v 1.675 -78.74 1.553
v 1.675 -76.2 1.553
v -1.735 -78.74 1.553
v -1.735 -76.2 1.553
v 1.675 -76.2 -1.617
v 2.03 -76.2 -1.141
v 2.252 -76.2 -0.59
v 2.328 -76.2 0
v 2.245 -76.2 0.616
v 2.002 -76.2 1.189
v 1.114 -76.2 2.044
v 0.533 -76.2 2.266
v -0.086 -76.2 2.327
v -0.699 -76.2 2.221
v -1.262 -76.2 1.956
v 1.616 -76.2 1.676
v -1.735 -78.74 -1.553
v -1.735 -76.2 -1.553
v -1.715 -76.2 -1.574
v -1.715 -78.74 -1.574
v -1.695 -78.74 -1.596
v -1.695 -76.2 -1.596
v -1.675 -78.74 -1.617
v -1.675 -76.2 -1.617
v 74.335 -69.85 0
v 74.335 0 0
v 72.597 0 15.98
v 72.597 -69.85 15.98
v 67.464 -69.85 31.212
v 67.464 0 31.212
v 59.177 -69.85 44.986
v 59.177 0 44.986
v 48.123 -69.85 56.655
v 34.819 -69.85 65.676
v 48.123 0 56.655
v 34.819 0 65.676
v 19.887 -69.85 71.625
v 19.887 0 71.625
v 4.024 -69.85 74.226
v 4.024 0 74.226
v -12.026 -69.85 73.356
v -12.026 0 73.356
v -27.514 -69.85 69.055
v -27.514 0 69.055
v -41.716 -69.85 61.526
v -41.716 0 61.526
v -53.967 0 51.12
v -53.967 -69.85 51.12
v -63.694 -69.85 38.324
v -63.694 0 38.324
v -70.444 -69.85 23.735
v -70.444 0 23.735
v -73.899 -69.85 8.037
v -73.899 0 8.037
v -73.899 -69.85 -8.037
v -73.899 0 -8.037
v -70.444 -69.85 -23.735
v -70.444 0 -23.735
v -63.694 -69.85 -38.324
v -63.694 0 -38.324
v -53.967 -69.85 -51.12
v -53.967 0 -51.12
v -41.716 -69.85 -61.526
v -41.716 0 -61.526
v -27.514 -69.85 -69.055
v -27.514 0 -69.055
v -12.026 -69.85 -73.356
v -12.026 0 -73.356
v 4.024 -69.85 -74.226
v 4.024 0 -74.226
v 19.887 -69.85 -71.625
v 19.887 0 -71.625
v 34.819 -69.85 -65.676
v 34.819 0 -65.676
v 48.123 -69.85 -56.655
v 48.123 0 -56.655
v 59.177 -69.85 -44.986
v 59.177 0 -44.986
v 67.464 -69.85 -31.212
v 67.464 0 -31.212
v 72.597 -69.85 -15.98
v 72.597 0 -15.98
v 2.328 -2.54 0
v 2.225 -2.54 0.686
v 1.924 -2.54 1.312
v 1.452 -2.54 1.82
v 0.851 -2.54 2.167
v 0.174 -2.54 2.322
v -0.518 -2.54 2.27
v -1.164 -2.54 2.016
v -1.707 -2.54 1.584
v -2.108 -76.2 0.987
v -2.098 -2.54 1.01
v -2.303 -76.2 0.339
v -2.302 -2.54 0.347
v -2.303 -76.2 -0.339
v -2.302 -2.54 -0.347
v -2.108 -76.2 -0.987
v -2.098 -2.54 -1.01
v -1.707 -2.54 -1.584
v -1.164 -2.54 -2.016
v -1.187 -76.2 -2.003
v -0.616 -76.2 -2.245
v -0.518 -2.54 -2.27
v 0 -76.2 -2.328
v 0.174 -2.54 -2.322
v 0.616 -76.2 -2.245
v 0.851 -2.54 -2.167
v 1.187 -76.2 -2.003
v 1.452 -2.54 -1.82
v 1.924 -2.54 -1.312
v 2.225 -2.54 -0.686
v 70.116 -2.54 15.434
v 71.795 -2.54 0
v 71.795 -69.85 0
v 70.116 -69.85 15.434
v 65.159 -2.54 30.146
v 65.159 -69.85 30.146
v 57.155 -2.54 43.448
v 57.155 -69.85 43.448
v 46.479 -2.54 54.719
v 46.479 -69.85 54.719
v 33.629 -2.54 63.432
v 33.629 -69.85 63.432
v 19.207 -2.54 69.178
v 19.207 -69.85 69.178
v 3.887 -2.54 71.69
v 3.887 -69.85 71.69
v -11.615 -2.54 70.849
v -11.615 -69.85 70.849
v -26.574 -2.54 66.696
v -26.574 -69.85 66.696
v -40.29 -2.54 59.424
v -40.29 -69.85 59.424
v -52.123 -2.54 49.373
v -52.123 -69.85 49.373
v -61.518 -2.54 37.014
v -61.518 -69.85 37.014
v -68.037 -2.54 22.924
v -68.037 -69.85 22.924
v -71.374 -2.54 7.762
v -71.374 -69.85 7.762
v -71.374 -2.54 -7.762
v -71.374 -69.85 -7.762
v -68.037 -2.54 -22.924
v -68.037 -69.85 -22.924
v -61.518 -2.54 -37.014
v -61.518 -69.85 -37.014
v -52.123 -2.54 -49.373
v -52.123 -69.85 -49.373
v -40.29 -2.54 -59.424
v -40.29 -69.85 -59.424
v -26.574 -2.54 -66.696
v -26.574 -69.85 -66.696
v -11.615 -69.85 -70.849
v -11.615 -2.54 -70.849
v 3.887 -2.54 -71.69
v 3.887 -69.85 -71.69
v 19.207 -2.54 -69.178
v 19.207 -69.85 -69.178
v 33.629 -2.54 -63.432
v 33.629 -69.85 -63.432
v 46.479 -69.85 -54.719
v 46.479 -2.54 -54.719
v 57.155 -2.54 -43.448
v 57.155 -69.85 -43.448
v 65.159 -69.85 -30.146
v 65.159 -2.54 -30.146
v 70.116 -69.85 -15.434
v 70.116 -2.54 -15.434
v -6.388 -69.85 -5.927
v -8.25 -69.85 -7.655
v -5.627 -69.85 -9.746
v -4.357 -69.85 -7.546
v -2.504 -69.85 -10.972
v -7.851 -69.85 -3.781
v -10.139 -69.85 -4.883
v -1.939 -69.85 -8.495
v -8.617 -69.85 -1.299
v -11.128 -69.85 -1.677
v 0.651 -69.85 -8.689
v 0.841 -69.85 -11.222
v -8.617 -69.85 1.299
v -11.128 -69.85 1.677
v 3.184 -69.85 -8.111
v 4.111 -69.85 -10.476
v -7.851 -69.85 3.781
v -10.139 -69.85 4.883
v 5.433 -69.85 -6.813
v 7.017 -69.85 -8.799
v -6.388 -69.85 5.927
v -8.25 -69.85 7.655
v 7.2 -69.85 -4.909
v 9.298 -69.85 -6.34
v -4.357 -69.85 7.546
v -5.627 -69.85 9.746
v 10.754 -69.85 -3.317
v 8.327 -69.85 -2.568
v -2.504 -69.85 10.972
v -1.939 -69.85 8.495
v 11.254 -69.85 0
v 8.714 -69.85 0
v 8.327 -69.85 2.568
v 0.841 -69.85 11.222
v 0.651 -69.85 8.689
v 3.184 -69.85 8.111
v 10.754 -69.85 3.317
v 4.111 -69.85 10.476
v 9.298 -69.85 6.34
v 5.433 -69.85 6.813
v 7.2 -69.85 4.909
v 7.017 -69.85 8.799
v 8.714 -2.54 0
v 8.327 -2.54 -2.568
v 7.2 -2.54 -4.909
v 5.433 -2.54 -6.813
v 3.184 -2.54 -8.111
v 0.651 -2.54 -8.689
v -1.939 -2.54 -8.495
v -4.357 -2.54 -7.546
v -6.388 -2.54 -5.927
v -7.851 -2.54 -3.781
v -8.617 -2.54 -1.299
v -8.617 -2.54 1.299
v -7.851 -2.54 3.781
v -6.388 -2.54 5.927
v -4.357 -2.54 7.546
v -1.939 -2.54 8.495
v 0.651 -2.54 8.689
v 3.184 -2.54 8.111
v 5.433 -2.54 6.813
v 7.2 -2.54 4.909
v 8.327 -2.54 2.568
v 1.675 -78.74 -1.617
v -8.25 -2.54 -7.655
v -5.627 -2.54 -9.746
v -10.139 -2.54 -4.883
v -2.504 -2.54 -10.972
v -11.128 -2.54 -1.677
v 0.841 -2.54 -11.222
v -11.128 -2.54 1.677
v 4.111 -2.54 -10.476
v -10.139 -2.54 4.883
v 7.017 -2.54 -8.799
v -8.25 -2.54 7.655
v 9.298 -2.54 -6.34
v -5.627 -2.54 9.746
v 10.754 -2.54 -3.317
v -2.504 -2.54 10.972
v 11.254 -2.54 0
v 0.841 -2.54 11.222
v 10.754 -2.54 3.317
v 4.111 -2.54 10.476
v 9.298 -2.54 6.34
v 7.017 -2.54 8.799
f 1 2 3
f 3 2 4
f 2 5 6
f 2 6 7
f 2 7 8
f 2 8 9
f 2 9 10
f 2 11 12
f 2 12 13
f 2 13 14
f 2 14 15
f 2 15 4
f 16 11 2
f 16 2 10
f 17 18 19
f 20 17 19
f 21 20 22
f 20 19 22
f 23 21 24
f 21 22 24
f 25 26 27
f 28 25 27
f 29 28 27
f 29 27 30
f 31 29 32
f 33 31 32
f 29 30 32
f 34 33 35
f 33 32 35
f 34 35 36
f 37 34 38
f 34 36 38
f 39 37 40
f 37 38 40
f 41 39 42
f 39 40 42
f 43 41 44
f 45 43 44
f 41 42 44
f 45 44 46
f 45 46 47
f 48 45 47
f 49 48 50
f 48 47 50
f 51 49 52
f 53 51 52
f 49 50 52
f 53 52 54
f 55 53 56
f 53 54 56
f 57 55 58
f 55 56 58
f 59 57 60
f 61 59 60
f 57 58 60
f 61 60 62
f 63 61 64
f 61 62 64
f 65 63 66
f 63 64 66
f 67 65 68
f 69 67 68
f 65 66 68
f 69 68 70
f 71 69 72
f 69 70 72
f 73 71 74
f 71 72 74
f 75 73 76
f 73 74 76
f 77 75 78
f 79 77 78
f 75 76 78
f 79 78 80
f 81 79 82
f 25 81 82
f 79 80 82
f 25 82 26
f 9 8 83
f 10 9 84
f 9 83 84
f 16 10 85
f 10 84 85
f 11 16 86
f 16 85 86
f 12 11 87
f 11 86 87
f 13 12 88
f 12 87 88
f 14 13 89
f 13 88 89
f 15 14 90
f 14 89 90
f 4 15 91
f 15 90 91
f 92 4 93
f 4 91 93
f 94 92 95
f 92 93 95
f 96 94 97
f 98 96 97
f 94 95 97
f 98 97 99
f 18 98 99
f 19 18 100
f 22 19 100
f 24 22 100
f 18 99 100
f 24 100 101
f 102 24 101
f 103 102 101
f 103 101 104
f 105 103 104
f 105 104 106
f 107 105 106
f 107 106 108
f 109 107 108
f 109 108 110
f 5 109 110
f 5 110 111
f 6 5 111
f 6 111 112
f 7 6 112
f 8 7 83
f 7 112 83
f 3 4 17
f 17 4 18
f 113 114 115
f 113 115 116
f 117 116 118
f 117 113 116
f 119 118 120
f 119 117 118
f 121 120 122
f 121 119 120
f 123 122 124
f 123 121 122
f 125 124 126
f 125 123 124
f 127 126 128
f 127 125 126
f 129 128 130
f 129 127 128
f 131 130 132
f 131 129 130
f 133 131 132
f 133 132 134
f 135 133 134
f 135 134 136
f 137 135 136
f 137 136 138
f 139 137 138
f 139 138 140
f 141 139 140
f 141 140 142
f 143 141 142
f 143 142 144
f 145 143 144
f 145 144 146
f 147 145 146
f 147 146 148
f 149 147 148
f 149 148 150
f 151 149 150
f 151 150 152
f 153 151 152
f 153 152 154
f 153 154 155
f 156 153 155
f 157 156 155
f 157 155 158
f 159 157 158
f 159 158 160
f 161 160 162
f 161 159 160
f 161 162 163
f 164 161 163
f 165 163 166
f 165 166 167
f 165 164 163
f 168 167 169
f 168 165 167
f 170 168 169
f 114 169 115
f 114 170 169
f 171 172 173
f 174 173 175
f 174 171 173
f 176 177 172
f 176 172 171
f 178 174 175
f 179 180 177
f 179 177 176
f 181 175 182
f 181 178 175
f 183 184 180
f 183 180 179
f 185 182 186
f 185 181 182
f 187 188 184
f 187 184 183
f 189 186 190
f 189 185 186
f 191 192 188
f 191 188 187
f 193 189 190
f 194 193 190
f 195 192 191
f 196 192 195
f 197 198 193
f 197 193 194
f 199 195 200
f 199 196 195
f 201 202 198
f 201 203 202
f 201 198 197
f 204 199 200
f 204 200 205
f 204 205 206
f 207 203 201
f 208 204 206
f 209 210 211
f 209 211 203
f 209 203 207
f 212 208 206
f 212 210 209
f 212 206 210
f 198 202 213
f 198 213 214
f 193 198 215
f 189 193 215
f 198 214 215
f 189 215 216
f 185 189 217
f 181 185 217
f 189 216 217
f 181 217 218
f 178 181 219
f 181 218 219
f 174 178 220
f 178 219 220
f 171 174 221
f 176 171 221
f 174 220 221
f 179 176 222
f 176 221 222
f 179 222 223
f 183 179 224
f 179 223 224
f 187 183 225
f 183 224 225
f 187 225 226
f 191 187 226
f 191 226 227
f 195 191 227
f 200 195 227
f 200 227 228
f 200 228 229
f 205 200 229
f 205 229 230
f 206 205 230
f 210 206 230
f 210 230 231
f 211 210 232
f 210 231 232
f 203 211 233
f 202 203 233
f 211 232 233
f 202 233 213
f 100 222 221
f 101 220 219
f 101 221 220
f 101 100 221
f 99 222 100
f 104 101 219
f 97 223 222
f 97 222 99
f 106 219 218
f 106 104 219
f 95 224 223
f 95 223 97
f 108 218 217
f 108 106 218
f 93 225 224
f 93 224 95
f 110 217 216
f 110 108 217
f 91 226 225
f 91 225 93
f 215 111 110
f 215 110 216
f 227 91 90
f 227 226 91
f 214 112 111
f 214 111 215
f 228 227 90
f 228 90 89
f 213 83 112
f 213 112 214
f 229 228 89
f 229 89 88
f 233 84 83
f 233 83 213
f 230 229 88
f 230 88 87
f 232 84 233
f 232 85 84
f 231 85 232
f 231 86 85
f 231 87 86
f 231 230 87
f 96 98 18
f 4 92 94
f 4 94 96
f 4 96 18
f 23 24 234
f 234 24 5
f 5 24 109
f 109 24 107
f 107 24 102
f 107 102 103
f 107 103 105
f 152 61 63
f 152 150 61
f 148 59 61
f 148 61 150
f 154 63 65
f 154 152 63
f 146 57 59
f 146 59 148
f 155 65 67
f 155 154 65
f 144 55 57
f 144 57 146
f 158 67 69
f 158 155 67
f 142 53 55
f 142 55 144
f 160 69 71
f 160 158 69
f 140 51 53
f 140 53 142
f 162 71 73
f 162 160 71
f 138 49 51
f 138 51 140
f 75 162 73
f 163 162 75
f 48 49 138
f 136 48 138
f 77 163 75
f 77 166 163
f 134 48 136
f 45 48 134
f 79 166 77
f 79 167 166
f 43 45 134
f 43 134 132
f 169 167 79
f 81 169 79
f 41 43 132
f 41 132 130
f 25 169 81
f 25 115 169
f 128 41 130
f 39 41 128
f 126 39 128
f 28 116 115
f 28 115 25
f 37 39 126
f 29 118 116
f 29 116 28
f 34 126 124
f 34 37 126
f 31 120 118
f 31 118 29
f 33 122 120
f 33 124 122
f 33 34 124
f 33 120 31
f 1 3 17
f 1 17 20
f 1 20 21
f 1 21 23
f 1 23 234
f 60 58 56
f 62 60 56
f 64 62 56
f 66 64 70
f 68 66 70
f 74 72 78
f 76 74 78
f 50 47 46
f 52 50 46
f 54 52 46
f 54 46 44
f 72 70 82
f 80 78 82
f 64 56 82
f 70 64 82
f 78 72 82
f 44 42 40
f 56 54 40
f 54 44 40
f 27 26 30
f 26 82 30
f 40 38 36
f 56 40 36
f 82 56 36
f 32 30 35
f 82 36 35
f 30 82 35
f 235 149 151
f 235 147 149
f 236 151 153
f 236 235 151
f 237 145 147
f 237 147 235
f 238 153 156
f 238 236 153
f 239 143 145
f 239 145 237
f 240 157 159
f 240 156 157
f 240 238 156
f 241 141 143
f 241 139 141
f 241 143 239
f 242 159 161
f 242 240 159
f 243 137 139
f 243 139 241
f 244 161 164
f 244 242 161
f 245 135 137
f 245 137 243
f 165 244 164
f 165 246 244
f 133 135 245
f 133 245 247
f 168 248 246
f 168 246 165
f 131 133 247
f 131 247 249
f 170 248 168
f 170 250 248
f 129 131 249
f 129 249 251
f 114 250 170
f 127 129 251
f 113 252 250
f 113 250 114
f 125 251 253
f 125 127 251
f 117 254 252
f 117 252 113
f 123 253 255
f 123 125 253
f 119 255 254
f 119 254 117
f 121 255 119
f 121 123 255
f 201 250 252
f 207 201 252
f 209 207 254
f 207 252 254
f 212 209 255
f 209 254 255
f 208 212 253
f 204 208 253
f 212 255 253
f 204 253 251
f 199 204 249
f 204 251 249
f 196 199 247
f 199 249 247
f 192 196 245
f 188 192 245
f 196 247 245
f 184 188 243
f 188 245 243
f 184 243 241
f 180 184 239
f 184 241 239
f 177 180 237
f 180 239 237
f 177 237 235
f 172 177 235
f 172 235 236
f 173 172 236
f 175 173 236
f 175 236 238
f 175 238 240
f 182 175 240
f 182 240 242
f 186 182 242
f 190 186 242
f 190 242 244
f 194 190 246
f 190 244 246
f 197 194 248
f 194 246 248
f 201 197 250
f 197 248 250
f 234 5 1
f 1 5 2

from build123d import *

# Parameters (mm, degrees)
F0_R     = 74.3348604036
F1_DEPTH = 69.85
F2_T     = -2.54
F3_R     = 11.2538360461
F4_DEPTH = 67.31
F5_T     = -2.54
F6_R     = 2.3281724299
F7_DEPTH = 73.66
F9_DEPTH = 2.54


# Not quite as in the source:
# - a shell that OpenCascade refuses in one call is made with other operations: the cavity is built on its own and cut out


with BuildPart() as f1:
    # F0 (on Front) → F1 (new body)
    with BuildSketch(Plane.XZ):
        Circle(F0_R)
    extrude(amount=F1_DEPTH)

    # F2
    f2_openings = [f1.faces().sort_by_distance(p)[0] for p in [
        (0, -69.85, 0),
    ]]
    offset(amount=F2_T, openings=f2_openings)

    # F3 (on face) → F4 (join)
    with BuildSketch(Plane.XZ.offset(2.54)):
        Circle(F3_R)
    extrude(amount=F4_DEPTH)

    # F5: a shell. OpenCascade refuses it in one call, so the cavity is built on its own and cut out:
    # the body offset inwards by the wall thickness, plus a prism from it out through each open face.
    f5_core = offset(f1.part, amount=F5_T, kind=Kind.INTERSECTION, mode=Mode.PRIVATE)
    f5_exits = [f5_core.faces().sort_by_distance(p)[0] for p in [
        (0, -67.31, 0),
    ]]
    add(f5_core, mode=Mode.SUBTRACT)
    extrude(f5_exits, amount=-F5_T, mode=Mode.SUBTRACT)

    # F6 (on face) → F7 (join)
    with BuildSketch(Plane.XZ.offset(2.54)):
        Circle(F6_R)
    extrude(amount=F7_DEPTH)

    # F8 (on face) → F9 (join)
    with BuildSketch(Plane.XZ.offset(76.2)):
        with BuildLine():
            Line((1.6746039799, 1.552517079), (-1.7349575161, 1.552517079))
            Line((-1.7349575161, 1.552517079), (-1.7349575161, -1.552517079))
            ThreePointArc((-1.7349575161, -1.552517079), (-1.7050897064, -1.5852621097), (-1.6746039799, -1.6174326489))
            Line((-1.6746039799, -1.6174326489), (1.6746039799, -1.6174326489))
            Line((1.6746039799, -1.6174326489), (1.6746039799, 1.552517079))
        make_face()
    extrude(amount=F9_DEPTH)


solid = f1.part
